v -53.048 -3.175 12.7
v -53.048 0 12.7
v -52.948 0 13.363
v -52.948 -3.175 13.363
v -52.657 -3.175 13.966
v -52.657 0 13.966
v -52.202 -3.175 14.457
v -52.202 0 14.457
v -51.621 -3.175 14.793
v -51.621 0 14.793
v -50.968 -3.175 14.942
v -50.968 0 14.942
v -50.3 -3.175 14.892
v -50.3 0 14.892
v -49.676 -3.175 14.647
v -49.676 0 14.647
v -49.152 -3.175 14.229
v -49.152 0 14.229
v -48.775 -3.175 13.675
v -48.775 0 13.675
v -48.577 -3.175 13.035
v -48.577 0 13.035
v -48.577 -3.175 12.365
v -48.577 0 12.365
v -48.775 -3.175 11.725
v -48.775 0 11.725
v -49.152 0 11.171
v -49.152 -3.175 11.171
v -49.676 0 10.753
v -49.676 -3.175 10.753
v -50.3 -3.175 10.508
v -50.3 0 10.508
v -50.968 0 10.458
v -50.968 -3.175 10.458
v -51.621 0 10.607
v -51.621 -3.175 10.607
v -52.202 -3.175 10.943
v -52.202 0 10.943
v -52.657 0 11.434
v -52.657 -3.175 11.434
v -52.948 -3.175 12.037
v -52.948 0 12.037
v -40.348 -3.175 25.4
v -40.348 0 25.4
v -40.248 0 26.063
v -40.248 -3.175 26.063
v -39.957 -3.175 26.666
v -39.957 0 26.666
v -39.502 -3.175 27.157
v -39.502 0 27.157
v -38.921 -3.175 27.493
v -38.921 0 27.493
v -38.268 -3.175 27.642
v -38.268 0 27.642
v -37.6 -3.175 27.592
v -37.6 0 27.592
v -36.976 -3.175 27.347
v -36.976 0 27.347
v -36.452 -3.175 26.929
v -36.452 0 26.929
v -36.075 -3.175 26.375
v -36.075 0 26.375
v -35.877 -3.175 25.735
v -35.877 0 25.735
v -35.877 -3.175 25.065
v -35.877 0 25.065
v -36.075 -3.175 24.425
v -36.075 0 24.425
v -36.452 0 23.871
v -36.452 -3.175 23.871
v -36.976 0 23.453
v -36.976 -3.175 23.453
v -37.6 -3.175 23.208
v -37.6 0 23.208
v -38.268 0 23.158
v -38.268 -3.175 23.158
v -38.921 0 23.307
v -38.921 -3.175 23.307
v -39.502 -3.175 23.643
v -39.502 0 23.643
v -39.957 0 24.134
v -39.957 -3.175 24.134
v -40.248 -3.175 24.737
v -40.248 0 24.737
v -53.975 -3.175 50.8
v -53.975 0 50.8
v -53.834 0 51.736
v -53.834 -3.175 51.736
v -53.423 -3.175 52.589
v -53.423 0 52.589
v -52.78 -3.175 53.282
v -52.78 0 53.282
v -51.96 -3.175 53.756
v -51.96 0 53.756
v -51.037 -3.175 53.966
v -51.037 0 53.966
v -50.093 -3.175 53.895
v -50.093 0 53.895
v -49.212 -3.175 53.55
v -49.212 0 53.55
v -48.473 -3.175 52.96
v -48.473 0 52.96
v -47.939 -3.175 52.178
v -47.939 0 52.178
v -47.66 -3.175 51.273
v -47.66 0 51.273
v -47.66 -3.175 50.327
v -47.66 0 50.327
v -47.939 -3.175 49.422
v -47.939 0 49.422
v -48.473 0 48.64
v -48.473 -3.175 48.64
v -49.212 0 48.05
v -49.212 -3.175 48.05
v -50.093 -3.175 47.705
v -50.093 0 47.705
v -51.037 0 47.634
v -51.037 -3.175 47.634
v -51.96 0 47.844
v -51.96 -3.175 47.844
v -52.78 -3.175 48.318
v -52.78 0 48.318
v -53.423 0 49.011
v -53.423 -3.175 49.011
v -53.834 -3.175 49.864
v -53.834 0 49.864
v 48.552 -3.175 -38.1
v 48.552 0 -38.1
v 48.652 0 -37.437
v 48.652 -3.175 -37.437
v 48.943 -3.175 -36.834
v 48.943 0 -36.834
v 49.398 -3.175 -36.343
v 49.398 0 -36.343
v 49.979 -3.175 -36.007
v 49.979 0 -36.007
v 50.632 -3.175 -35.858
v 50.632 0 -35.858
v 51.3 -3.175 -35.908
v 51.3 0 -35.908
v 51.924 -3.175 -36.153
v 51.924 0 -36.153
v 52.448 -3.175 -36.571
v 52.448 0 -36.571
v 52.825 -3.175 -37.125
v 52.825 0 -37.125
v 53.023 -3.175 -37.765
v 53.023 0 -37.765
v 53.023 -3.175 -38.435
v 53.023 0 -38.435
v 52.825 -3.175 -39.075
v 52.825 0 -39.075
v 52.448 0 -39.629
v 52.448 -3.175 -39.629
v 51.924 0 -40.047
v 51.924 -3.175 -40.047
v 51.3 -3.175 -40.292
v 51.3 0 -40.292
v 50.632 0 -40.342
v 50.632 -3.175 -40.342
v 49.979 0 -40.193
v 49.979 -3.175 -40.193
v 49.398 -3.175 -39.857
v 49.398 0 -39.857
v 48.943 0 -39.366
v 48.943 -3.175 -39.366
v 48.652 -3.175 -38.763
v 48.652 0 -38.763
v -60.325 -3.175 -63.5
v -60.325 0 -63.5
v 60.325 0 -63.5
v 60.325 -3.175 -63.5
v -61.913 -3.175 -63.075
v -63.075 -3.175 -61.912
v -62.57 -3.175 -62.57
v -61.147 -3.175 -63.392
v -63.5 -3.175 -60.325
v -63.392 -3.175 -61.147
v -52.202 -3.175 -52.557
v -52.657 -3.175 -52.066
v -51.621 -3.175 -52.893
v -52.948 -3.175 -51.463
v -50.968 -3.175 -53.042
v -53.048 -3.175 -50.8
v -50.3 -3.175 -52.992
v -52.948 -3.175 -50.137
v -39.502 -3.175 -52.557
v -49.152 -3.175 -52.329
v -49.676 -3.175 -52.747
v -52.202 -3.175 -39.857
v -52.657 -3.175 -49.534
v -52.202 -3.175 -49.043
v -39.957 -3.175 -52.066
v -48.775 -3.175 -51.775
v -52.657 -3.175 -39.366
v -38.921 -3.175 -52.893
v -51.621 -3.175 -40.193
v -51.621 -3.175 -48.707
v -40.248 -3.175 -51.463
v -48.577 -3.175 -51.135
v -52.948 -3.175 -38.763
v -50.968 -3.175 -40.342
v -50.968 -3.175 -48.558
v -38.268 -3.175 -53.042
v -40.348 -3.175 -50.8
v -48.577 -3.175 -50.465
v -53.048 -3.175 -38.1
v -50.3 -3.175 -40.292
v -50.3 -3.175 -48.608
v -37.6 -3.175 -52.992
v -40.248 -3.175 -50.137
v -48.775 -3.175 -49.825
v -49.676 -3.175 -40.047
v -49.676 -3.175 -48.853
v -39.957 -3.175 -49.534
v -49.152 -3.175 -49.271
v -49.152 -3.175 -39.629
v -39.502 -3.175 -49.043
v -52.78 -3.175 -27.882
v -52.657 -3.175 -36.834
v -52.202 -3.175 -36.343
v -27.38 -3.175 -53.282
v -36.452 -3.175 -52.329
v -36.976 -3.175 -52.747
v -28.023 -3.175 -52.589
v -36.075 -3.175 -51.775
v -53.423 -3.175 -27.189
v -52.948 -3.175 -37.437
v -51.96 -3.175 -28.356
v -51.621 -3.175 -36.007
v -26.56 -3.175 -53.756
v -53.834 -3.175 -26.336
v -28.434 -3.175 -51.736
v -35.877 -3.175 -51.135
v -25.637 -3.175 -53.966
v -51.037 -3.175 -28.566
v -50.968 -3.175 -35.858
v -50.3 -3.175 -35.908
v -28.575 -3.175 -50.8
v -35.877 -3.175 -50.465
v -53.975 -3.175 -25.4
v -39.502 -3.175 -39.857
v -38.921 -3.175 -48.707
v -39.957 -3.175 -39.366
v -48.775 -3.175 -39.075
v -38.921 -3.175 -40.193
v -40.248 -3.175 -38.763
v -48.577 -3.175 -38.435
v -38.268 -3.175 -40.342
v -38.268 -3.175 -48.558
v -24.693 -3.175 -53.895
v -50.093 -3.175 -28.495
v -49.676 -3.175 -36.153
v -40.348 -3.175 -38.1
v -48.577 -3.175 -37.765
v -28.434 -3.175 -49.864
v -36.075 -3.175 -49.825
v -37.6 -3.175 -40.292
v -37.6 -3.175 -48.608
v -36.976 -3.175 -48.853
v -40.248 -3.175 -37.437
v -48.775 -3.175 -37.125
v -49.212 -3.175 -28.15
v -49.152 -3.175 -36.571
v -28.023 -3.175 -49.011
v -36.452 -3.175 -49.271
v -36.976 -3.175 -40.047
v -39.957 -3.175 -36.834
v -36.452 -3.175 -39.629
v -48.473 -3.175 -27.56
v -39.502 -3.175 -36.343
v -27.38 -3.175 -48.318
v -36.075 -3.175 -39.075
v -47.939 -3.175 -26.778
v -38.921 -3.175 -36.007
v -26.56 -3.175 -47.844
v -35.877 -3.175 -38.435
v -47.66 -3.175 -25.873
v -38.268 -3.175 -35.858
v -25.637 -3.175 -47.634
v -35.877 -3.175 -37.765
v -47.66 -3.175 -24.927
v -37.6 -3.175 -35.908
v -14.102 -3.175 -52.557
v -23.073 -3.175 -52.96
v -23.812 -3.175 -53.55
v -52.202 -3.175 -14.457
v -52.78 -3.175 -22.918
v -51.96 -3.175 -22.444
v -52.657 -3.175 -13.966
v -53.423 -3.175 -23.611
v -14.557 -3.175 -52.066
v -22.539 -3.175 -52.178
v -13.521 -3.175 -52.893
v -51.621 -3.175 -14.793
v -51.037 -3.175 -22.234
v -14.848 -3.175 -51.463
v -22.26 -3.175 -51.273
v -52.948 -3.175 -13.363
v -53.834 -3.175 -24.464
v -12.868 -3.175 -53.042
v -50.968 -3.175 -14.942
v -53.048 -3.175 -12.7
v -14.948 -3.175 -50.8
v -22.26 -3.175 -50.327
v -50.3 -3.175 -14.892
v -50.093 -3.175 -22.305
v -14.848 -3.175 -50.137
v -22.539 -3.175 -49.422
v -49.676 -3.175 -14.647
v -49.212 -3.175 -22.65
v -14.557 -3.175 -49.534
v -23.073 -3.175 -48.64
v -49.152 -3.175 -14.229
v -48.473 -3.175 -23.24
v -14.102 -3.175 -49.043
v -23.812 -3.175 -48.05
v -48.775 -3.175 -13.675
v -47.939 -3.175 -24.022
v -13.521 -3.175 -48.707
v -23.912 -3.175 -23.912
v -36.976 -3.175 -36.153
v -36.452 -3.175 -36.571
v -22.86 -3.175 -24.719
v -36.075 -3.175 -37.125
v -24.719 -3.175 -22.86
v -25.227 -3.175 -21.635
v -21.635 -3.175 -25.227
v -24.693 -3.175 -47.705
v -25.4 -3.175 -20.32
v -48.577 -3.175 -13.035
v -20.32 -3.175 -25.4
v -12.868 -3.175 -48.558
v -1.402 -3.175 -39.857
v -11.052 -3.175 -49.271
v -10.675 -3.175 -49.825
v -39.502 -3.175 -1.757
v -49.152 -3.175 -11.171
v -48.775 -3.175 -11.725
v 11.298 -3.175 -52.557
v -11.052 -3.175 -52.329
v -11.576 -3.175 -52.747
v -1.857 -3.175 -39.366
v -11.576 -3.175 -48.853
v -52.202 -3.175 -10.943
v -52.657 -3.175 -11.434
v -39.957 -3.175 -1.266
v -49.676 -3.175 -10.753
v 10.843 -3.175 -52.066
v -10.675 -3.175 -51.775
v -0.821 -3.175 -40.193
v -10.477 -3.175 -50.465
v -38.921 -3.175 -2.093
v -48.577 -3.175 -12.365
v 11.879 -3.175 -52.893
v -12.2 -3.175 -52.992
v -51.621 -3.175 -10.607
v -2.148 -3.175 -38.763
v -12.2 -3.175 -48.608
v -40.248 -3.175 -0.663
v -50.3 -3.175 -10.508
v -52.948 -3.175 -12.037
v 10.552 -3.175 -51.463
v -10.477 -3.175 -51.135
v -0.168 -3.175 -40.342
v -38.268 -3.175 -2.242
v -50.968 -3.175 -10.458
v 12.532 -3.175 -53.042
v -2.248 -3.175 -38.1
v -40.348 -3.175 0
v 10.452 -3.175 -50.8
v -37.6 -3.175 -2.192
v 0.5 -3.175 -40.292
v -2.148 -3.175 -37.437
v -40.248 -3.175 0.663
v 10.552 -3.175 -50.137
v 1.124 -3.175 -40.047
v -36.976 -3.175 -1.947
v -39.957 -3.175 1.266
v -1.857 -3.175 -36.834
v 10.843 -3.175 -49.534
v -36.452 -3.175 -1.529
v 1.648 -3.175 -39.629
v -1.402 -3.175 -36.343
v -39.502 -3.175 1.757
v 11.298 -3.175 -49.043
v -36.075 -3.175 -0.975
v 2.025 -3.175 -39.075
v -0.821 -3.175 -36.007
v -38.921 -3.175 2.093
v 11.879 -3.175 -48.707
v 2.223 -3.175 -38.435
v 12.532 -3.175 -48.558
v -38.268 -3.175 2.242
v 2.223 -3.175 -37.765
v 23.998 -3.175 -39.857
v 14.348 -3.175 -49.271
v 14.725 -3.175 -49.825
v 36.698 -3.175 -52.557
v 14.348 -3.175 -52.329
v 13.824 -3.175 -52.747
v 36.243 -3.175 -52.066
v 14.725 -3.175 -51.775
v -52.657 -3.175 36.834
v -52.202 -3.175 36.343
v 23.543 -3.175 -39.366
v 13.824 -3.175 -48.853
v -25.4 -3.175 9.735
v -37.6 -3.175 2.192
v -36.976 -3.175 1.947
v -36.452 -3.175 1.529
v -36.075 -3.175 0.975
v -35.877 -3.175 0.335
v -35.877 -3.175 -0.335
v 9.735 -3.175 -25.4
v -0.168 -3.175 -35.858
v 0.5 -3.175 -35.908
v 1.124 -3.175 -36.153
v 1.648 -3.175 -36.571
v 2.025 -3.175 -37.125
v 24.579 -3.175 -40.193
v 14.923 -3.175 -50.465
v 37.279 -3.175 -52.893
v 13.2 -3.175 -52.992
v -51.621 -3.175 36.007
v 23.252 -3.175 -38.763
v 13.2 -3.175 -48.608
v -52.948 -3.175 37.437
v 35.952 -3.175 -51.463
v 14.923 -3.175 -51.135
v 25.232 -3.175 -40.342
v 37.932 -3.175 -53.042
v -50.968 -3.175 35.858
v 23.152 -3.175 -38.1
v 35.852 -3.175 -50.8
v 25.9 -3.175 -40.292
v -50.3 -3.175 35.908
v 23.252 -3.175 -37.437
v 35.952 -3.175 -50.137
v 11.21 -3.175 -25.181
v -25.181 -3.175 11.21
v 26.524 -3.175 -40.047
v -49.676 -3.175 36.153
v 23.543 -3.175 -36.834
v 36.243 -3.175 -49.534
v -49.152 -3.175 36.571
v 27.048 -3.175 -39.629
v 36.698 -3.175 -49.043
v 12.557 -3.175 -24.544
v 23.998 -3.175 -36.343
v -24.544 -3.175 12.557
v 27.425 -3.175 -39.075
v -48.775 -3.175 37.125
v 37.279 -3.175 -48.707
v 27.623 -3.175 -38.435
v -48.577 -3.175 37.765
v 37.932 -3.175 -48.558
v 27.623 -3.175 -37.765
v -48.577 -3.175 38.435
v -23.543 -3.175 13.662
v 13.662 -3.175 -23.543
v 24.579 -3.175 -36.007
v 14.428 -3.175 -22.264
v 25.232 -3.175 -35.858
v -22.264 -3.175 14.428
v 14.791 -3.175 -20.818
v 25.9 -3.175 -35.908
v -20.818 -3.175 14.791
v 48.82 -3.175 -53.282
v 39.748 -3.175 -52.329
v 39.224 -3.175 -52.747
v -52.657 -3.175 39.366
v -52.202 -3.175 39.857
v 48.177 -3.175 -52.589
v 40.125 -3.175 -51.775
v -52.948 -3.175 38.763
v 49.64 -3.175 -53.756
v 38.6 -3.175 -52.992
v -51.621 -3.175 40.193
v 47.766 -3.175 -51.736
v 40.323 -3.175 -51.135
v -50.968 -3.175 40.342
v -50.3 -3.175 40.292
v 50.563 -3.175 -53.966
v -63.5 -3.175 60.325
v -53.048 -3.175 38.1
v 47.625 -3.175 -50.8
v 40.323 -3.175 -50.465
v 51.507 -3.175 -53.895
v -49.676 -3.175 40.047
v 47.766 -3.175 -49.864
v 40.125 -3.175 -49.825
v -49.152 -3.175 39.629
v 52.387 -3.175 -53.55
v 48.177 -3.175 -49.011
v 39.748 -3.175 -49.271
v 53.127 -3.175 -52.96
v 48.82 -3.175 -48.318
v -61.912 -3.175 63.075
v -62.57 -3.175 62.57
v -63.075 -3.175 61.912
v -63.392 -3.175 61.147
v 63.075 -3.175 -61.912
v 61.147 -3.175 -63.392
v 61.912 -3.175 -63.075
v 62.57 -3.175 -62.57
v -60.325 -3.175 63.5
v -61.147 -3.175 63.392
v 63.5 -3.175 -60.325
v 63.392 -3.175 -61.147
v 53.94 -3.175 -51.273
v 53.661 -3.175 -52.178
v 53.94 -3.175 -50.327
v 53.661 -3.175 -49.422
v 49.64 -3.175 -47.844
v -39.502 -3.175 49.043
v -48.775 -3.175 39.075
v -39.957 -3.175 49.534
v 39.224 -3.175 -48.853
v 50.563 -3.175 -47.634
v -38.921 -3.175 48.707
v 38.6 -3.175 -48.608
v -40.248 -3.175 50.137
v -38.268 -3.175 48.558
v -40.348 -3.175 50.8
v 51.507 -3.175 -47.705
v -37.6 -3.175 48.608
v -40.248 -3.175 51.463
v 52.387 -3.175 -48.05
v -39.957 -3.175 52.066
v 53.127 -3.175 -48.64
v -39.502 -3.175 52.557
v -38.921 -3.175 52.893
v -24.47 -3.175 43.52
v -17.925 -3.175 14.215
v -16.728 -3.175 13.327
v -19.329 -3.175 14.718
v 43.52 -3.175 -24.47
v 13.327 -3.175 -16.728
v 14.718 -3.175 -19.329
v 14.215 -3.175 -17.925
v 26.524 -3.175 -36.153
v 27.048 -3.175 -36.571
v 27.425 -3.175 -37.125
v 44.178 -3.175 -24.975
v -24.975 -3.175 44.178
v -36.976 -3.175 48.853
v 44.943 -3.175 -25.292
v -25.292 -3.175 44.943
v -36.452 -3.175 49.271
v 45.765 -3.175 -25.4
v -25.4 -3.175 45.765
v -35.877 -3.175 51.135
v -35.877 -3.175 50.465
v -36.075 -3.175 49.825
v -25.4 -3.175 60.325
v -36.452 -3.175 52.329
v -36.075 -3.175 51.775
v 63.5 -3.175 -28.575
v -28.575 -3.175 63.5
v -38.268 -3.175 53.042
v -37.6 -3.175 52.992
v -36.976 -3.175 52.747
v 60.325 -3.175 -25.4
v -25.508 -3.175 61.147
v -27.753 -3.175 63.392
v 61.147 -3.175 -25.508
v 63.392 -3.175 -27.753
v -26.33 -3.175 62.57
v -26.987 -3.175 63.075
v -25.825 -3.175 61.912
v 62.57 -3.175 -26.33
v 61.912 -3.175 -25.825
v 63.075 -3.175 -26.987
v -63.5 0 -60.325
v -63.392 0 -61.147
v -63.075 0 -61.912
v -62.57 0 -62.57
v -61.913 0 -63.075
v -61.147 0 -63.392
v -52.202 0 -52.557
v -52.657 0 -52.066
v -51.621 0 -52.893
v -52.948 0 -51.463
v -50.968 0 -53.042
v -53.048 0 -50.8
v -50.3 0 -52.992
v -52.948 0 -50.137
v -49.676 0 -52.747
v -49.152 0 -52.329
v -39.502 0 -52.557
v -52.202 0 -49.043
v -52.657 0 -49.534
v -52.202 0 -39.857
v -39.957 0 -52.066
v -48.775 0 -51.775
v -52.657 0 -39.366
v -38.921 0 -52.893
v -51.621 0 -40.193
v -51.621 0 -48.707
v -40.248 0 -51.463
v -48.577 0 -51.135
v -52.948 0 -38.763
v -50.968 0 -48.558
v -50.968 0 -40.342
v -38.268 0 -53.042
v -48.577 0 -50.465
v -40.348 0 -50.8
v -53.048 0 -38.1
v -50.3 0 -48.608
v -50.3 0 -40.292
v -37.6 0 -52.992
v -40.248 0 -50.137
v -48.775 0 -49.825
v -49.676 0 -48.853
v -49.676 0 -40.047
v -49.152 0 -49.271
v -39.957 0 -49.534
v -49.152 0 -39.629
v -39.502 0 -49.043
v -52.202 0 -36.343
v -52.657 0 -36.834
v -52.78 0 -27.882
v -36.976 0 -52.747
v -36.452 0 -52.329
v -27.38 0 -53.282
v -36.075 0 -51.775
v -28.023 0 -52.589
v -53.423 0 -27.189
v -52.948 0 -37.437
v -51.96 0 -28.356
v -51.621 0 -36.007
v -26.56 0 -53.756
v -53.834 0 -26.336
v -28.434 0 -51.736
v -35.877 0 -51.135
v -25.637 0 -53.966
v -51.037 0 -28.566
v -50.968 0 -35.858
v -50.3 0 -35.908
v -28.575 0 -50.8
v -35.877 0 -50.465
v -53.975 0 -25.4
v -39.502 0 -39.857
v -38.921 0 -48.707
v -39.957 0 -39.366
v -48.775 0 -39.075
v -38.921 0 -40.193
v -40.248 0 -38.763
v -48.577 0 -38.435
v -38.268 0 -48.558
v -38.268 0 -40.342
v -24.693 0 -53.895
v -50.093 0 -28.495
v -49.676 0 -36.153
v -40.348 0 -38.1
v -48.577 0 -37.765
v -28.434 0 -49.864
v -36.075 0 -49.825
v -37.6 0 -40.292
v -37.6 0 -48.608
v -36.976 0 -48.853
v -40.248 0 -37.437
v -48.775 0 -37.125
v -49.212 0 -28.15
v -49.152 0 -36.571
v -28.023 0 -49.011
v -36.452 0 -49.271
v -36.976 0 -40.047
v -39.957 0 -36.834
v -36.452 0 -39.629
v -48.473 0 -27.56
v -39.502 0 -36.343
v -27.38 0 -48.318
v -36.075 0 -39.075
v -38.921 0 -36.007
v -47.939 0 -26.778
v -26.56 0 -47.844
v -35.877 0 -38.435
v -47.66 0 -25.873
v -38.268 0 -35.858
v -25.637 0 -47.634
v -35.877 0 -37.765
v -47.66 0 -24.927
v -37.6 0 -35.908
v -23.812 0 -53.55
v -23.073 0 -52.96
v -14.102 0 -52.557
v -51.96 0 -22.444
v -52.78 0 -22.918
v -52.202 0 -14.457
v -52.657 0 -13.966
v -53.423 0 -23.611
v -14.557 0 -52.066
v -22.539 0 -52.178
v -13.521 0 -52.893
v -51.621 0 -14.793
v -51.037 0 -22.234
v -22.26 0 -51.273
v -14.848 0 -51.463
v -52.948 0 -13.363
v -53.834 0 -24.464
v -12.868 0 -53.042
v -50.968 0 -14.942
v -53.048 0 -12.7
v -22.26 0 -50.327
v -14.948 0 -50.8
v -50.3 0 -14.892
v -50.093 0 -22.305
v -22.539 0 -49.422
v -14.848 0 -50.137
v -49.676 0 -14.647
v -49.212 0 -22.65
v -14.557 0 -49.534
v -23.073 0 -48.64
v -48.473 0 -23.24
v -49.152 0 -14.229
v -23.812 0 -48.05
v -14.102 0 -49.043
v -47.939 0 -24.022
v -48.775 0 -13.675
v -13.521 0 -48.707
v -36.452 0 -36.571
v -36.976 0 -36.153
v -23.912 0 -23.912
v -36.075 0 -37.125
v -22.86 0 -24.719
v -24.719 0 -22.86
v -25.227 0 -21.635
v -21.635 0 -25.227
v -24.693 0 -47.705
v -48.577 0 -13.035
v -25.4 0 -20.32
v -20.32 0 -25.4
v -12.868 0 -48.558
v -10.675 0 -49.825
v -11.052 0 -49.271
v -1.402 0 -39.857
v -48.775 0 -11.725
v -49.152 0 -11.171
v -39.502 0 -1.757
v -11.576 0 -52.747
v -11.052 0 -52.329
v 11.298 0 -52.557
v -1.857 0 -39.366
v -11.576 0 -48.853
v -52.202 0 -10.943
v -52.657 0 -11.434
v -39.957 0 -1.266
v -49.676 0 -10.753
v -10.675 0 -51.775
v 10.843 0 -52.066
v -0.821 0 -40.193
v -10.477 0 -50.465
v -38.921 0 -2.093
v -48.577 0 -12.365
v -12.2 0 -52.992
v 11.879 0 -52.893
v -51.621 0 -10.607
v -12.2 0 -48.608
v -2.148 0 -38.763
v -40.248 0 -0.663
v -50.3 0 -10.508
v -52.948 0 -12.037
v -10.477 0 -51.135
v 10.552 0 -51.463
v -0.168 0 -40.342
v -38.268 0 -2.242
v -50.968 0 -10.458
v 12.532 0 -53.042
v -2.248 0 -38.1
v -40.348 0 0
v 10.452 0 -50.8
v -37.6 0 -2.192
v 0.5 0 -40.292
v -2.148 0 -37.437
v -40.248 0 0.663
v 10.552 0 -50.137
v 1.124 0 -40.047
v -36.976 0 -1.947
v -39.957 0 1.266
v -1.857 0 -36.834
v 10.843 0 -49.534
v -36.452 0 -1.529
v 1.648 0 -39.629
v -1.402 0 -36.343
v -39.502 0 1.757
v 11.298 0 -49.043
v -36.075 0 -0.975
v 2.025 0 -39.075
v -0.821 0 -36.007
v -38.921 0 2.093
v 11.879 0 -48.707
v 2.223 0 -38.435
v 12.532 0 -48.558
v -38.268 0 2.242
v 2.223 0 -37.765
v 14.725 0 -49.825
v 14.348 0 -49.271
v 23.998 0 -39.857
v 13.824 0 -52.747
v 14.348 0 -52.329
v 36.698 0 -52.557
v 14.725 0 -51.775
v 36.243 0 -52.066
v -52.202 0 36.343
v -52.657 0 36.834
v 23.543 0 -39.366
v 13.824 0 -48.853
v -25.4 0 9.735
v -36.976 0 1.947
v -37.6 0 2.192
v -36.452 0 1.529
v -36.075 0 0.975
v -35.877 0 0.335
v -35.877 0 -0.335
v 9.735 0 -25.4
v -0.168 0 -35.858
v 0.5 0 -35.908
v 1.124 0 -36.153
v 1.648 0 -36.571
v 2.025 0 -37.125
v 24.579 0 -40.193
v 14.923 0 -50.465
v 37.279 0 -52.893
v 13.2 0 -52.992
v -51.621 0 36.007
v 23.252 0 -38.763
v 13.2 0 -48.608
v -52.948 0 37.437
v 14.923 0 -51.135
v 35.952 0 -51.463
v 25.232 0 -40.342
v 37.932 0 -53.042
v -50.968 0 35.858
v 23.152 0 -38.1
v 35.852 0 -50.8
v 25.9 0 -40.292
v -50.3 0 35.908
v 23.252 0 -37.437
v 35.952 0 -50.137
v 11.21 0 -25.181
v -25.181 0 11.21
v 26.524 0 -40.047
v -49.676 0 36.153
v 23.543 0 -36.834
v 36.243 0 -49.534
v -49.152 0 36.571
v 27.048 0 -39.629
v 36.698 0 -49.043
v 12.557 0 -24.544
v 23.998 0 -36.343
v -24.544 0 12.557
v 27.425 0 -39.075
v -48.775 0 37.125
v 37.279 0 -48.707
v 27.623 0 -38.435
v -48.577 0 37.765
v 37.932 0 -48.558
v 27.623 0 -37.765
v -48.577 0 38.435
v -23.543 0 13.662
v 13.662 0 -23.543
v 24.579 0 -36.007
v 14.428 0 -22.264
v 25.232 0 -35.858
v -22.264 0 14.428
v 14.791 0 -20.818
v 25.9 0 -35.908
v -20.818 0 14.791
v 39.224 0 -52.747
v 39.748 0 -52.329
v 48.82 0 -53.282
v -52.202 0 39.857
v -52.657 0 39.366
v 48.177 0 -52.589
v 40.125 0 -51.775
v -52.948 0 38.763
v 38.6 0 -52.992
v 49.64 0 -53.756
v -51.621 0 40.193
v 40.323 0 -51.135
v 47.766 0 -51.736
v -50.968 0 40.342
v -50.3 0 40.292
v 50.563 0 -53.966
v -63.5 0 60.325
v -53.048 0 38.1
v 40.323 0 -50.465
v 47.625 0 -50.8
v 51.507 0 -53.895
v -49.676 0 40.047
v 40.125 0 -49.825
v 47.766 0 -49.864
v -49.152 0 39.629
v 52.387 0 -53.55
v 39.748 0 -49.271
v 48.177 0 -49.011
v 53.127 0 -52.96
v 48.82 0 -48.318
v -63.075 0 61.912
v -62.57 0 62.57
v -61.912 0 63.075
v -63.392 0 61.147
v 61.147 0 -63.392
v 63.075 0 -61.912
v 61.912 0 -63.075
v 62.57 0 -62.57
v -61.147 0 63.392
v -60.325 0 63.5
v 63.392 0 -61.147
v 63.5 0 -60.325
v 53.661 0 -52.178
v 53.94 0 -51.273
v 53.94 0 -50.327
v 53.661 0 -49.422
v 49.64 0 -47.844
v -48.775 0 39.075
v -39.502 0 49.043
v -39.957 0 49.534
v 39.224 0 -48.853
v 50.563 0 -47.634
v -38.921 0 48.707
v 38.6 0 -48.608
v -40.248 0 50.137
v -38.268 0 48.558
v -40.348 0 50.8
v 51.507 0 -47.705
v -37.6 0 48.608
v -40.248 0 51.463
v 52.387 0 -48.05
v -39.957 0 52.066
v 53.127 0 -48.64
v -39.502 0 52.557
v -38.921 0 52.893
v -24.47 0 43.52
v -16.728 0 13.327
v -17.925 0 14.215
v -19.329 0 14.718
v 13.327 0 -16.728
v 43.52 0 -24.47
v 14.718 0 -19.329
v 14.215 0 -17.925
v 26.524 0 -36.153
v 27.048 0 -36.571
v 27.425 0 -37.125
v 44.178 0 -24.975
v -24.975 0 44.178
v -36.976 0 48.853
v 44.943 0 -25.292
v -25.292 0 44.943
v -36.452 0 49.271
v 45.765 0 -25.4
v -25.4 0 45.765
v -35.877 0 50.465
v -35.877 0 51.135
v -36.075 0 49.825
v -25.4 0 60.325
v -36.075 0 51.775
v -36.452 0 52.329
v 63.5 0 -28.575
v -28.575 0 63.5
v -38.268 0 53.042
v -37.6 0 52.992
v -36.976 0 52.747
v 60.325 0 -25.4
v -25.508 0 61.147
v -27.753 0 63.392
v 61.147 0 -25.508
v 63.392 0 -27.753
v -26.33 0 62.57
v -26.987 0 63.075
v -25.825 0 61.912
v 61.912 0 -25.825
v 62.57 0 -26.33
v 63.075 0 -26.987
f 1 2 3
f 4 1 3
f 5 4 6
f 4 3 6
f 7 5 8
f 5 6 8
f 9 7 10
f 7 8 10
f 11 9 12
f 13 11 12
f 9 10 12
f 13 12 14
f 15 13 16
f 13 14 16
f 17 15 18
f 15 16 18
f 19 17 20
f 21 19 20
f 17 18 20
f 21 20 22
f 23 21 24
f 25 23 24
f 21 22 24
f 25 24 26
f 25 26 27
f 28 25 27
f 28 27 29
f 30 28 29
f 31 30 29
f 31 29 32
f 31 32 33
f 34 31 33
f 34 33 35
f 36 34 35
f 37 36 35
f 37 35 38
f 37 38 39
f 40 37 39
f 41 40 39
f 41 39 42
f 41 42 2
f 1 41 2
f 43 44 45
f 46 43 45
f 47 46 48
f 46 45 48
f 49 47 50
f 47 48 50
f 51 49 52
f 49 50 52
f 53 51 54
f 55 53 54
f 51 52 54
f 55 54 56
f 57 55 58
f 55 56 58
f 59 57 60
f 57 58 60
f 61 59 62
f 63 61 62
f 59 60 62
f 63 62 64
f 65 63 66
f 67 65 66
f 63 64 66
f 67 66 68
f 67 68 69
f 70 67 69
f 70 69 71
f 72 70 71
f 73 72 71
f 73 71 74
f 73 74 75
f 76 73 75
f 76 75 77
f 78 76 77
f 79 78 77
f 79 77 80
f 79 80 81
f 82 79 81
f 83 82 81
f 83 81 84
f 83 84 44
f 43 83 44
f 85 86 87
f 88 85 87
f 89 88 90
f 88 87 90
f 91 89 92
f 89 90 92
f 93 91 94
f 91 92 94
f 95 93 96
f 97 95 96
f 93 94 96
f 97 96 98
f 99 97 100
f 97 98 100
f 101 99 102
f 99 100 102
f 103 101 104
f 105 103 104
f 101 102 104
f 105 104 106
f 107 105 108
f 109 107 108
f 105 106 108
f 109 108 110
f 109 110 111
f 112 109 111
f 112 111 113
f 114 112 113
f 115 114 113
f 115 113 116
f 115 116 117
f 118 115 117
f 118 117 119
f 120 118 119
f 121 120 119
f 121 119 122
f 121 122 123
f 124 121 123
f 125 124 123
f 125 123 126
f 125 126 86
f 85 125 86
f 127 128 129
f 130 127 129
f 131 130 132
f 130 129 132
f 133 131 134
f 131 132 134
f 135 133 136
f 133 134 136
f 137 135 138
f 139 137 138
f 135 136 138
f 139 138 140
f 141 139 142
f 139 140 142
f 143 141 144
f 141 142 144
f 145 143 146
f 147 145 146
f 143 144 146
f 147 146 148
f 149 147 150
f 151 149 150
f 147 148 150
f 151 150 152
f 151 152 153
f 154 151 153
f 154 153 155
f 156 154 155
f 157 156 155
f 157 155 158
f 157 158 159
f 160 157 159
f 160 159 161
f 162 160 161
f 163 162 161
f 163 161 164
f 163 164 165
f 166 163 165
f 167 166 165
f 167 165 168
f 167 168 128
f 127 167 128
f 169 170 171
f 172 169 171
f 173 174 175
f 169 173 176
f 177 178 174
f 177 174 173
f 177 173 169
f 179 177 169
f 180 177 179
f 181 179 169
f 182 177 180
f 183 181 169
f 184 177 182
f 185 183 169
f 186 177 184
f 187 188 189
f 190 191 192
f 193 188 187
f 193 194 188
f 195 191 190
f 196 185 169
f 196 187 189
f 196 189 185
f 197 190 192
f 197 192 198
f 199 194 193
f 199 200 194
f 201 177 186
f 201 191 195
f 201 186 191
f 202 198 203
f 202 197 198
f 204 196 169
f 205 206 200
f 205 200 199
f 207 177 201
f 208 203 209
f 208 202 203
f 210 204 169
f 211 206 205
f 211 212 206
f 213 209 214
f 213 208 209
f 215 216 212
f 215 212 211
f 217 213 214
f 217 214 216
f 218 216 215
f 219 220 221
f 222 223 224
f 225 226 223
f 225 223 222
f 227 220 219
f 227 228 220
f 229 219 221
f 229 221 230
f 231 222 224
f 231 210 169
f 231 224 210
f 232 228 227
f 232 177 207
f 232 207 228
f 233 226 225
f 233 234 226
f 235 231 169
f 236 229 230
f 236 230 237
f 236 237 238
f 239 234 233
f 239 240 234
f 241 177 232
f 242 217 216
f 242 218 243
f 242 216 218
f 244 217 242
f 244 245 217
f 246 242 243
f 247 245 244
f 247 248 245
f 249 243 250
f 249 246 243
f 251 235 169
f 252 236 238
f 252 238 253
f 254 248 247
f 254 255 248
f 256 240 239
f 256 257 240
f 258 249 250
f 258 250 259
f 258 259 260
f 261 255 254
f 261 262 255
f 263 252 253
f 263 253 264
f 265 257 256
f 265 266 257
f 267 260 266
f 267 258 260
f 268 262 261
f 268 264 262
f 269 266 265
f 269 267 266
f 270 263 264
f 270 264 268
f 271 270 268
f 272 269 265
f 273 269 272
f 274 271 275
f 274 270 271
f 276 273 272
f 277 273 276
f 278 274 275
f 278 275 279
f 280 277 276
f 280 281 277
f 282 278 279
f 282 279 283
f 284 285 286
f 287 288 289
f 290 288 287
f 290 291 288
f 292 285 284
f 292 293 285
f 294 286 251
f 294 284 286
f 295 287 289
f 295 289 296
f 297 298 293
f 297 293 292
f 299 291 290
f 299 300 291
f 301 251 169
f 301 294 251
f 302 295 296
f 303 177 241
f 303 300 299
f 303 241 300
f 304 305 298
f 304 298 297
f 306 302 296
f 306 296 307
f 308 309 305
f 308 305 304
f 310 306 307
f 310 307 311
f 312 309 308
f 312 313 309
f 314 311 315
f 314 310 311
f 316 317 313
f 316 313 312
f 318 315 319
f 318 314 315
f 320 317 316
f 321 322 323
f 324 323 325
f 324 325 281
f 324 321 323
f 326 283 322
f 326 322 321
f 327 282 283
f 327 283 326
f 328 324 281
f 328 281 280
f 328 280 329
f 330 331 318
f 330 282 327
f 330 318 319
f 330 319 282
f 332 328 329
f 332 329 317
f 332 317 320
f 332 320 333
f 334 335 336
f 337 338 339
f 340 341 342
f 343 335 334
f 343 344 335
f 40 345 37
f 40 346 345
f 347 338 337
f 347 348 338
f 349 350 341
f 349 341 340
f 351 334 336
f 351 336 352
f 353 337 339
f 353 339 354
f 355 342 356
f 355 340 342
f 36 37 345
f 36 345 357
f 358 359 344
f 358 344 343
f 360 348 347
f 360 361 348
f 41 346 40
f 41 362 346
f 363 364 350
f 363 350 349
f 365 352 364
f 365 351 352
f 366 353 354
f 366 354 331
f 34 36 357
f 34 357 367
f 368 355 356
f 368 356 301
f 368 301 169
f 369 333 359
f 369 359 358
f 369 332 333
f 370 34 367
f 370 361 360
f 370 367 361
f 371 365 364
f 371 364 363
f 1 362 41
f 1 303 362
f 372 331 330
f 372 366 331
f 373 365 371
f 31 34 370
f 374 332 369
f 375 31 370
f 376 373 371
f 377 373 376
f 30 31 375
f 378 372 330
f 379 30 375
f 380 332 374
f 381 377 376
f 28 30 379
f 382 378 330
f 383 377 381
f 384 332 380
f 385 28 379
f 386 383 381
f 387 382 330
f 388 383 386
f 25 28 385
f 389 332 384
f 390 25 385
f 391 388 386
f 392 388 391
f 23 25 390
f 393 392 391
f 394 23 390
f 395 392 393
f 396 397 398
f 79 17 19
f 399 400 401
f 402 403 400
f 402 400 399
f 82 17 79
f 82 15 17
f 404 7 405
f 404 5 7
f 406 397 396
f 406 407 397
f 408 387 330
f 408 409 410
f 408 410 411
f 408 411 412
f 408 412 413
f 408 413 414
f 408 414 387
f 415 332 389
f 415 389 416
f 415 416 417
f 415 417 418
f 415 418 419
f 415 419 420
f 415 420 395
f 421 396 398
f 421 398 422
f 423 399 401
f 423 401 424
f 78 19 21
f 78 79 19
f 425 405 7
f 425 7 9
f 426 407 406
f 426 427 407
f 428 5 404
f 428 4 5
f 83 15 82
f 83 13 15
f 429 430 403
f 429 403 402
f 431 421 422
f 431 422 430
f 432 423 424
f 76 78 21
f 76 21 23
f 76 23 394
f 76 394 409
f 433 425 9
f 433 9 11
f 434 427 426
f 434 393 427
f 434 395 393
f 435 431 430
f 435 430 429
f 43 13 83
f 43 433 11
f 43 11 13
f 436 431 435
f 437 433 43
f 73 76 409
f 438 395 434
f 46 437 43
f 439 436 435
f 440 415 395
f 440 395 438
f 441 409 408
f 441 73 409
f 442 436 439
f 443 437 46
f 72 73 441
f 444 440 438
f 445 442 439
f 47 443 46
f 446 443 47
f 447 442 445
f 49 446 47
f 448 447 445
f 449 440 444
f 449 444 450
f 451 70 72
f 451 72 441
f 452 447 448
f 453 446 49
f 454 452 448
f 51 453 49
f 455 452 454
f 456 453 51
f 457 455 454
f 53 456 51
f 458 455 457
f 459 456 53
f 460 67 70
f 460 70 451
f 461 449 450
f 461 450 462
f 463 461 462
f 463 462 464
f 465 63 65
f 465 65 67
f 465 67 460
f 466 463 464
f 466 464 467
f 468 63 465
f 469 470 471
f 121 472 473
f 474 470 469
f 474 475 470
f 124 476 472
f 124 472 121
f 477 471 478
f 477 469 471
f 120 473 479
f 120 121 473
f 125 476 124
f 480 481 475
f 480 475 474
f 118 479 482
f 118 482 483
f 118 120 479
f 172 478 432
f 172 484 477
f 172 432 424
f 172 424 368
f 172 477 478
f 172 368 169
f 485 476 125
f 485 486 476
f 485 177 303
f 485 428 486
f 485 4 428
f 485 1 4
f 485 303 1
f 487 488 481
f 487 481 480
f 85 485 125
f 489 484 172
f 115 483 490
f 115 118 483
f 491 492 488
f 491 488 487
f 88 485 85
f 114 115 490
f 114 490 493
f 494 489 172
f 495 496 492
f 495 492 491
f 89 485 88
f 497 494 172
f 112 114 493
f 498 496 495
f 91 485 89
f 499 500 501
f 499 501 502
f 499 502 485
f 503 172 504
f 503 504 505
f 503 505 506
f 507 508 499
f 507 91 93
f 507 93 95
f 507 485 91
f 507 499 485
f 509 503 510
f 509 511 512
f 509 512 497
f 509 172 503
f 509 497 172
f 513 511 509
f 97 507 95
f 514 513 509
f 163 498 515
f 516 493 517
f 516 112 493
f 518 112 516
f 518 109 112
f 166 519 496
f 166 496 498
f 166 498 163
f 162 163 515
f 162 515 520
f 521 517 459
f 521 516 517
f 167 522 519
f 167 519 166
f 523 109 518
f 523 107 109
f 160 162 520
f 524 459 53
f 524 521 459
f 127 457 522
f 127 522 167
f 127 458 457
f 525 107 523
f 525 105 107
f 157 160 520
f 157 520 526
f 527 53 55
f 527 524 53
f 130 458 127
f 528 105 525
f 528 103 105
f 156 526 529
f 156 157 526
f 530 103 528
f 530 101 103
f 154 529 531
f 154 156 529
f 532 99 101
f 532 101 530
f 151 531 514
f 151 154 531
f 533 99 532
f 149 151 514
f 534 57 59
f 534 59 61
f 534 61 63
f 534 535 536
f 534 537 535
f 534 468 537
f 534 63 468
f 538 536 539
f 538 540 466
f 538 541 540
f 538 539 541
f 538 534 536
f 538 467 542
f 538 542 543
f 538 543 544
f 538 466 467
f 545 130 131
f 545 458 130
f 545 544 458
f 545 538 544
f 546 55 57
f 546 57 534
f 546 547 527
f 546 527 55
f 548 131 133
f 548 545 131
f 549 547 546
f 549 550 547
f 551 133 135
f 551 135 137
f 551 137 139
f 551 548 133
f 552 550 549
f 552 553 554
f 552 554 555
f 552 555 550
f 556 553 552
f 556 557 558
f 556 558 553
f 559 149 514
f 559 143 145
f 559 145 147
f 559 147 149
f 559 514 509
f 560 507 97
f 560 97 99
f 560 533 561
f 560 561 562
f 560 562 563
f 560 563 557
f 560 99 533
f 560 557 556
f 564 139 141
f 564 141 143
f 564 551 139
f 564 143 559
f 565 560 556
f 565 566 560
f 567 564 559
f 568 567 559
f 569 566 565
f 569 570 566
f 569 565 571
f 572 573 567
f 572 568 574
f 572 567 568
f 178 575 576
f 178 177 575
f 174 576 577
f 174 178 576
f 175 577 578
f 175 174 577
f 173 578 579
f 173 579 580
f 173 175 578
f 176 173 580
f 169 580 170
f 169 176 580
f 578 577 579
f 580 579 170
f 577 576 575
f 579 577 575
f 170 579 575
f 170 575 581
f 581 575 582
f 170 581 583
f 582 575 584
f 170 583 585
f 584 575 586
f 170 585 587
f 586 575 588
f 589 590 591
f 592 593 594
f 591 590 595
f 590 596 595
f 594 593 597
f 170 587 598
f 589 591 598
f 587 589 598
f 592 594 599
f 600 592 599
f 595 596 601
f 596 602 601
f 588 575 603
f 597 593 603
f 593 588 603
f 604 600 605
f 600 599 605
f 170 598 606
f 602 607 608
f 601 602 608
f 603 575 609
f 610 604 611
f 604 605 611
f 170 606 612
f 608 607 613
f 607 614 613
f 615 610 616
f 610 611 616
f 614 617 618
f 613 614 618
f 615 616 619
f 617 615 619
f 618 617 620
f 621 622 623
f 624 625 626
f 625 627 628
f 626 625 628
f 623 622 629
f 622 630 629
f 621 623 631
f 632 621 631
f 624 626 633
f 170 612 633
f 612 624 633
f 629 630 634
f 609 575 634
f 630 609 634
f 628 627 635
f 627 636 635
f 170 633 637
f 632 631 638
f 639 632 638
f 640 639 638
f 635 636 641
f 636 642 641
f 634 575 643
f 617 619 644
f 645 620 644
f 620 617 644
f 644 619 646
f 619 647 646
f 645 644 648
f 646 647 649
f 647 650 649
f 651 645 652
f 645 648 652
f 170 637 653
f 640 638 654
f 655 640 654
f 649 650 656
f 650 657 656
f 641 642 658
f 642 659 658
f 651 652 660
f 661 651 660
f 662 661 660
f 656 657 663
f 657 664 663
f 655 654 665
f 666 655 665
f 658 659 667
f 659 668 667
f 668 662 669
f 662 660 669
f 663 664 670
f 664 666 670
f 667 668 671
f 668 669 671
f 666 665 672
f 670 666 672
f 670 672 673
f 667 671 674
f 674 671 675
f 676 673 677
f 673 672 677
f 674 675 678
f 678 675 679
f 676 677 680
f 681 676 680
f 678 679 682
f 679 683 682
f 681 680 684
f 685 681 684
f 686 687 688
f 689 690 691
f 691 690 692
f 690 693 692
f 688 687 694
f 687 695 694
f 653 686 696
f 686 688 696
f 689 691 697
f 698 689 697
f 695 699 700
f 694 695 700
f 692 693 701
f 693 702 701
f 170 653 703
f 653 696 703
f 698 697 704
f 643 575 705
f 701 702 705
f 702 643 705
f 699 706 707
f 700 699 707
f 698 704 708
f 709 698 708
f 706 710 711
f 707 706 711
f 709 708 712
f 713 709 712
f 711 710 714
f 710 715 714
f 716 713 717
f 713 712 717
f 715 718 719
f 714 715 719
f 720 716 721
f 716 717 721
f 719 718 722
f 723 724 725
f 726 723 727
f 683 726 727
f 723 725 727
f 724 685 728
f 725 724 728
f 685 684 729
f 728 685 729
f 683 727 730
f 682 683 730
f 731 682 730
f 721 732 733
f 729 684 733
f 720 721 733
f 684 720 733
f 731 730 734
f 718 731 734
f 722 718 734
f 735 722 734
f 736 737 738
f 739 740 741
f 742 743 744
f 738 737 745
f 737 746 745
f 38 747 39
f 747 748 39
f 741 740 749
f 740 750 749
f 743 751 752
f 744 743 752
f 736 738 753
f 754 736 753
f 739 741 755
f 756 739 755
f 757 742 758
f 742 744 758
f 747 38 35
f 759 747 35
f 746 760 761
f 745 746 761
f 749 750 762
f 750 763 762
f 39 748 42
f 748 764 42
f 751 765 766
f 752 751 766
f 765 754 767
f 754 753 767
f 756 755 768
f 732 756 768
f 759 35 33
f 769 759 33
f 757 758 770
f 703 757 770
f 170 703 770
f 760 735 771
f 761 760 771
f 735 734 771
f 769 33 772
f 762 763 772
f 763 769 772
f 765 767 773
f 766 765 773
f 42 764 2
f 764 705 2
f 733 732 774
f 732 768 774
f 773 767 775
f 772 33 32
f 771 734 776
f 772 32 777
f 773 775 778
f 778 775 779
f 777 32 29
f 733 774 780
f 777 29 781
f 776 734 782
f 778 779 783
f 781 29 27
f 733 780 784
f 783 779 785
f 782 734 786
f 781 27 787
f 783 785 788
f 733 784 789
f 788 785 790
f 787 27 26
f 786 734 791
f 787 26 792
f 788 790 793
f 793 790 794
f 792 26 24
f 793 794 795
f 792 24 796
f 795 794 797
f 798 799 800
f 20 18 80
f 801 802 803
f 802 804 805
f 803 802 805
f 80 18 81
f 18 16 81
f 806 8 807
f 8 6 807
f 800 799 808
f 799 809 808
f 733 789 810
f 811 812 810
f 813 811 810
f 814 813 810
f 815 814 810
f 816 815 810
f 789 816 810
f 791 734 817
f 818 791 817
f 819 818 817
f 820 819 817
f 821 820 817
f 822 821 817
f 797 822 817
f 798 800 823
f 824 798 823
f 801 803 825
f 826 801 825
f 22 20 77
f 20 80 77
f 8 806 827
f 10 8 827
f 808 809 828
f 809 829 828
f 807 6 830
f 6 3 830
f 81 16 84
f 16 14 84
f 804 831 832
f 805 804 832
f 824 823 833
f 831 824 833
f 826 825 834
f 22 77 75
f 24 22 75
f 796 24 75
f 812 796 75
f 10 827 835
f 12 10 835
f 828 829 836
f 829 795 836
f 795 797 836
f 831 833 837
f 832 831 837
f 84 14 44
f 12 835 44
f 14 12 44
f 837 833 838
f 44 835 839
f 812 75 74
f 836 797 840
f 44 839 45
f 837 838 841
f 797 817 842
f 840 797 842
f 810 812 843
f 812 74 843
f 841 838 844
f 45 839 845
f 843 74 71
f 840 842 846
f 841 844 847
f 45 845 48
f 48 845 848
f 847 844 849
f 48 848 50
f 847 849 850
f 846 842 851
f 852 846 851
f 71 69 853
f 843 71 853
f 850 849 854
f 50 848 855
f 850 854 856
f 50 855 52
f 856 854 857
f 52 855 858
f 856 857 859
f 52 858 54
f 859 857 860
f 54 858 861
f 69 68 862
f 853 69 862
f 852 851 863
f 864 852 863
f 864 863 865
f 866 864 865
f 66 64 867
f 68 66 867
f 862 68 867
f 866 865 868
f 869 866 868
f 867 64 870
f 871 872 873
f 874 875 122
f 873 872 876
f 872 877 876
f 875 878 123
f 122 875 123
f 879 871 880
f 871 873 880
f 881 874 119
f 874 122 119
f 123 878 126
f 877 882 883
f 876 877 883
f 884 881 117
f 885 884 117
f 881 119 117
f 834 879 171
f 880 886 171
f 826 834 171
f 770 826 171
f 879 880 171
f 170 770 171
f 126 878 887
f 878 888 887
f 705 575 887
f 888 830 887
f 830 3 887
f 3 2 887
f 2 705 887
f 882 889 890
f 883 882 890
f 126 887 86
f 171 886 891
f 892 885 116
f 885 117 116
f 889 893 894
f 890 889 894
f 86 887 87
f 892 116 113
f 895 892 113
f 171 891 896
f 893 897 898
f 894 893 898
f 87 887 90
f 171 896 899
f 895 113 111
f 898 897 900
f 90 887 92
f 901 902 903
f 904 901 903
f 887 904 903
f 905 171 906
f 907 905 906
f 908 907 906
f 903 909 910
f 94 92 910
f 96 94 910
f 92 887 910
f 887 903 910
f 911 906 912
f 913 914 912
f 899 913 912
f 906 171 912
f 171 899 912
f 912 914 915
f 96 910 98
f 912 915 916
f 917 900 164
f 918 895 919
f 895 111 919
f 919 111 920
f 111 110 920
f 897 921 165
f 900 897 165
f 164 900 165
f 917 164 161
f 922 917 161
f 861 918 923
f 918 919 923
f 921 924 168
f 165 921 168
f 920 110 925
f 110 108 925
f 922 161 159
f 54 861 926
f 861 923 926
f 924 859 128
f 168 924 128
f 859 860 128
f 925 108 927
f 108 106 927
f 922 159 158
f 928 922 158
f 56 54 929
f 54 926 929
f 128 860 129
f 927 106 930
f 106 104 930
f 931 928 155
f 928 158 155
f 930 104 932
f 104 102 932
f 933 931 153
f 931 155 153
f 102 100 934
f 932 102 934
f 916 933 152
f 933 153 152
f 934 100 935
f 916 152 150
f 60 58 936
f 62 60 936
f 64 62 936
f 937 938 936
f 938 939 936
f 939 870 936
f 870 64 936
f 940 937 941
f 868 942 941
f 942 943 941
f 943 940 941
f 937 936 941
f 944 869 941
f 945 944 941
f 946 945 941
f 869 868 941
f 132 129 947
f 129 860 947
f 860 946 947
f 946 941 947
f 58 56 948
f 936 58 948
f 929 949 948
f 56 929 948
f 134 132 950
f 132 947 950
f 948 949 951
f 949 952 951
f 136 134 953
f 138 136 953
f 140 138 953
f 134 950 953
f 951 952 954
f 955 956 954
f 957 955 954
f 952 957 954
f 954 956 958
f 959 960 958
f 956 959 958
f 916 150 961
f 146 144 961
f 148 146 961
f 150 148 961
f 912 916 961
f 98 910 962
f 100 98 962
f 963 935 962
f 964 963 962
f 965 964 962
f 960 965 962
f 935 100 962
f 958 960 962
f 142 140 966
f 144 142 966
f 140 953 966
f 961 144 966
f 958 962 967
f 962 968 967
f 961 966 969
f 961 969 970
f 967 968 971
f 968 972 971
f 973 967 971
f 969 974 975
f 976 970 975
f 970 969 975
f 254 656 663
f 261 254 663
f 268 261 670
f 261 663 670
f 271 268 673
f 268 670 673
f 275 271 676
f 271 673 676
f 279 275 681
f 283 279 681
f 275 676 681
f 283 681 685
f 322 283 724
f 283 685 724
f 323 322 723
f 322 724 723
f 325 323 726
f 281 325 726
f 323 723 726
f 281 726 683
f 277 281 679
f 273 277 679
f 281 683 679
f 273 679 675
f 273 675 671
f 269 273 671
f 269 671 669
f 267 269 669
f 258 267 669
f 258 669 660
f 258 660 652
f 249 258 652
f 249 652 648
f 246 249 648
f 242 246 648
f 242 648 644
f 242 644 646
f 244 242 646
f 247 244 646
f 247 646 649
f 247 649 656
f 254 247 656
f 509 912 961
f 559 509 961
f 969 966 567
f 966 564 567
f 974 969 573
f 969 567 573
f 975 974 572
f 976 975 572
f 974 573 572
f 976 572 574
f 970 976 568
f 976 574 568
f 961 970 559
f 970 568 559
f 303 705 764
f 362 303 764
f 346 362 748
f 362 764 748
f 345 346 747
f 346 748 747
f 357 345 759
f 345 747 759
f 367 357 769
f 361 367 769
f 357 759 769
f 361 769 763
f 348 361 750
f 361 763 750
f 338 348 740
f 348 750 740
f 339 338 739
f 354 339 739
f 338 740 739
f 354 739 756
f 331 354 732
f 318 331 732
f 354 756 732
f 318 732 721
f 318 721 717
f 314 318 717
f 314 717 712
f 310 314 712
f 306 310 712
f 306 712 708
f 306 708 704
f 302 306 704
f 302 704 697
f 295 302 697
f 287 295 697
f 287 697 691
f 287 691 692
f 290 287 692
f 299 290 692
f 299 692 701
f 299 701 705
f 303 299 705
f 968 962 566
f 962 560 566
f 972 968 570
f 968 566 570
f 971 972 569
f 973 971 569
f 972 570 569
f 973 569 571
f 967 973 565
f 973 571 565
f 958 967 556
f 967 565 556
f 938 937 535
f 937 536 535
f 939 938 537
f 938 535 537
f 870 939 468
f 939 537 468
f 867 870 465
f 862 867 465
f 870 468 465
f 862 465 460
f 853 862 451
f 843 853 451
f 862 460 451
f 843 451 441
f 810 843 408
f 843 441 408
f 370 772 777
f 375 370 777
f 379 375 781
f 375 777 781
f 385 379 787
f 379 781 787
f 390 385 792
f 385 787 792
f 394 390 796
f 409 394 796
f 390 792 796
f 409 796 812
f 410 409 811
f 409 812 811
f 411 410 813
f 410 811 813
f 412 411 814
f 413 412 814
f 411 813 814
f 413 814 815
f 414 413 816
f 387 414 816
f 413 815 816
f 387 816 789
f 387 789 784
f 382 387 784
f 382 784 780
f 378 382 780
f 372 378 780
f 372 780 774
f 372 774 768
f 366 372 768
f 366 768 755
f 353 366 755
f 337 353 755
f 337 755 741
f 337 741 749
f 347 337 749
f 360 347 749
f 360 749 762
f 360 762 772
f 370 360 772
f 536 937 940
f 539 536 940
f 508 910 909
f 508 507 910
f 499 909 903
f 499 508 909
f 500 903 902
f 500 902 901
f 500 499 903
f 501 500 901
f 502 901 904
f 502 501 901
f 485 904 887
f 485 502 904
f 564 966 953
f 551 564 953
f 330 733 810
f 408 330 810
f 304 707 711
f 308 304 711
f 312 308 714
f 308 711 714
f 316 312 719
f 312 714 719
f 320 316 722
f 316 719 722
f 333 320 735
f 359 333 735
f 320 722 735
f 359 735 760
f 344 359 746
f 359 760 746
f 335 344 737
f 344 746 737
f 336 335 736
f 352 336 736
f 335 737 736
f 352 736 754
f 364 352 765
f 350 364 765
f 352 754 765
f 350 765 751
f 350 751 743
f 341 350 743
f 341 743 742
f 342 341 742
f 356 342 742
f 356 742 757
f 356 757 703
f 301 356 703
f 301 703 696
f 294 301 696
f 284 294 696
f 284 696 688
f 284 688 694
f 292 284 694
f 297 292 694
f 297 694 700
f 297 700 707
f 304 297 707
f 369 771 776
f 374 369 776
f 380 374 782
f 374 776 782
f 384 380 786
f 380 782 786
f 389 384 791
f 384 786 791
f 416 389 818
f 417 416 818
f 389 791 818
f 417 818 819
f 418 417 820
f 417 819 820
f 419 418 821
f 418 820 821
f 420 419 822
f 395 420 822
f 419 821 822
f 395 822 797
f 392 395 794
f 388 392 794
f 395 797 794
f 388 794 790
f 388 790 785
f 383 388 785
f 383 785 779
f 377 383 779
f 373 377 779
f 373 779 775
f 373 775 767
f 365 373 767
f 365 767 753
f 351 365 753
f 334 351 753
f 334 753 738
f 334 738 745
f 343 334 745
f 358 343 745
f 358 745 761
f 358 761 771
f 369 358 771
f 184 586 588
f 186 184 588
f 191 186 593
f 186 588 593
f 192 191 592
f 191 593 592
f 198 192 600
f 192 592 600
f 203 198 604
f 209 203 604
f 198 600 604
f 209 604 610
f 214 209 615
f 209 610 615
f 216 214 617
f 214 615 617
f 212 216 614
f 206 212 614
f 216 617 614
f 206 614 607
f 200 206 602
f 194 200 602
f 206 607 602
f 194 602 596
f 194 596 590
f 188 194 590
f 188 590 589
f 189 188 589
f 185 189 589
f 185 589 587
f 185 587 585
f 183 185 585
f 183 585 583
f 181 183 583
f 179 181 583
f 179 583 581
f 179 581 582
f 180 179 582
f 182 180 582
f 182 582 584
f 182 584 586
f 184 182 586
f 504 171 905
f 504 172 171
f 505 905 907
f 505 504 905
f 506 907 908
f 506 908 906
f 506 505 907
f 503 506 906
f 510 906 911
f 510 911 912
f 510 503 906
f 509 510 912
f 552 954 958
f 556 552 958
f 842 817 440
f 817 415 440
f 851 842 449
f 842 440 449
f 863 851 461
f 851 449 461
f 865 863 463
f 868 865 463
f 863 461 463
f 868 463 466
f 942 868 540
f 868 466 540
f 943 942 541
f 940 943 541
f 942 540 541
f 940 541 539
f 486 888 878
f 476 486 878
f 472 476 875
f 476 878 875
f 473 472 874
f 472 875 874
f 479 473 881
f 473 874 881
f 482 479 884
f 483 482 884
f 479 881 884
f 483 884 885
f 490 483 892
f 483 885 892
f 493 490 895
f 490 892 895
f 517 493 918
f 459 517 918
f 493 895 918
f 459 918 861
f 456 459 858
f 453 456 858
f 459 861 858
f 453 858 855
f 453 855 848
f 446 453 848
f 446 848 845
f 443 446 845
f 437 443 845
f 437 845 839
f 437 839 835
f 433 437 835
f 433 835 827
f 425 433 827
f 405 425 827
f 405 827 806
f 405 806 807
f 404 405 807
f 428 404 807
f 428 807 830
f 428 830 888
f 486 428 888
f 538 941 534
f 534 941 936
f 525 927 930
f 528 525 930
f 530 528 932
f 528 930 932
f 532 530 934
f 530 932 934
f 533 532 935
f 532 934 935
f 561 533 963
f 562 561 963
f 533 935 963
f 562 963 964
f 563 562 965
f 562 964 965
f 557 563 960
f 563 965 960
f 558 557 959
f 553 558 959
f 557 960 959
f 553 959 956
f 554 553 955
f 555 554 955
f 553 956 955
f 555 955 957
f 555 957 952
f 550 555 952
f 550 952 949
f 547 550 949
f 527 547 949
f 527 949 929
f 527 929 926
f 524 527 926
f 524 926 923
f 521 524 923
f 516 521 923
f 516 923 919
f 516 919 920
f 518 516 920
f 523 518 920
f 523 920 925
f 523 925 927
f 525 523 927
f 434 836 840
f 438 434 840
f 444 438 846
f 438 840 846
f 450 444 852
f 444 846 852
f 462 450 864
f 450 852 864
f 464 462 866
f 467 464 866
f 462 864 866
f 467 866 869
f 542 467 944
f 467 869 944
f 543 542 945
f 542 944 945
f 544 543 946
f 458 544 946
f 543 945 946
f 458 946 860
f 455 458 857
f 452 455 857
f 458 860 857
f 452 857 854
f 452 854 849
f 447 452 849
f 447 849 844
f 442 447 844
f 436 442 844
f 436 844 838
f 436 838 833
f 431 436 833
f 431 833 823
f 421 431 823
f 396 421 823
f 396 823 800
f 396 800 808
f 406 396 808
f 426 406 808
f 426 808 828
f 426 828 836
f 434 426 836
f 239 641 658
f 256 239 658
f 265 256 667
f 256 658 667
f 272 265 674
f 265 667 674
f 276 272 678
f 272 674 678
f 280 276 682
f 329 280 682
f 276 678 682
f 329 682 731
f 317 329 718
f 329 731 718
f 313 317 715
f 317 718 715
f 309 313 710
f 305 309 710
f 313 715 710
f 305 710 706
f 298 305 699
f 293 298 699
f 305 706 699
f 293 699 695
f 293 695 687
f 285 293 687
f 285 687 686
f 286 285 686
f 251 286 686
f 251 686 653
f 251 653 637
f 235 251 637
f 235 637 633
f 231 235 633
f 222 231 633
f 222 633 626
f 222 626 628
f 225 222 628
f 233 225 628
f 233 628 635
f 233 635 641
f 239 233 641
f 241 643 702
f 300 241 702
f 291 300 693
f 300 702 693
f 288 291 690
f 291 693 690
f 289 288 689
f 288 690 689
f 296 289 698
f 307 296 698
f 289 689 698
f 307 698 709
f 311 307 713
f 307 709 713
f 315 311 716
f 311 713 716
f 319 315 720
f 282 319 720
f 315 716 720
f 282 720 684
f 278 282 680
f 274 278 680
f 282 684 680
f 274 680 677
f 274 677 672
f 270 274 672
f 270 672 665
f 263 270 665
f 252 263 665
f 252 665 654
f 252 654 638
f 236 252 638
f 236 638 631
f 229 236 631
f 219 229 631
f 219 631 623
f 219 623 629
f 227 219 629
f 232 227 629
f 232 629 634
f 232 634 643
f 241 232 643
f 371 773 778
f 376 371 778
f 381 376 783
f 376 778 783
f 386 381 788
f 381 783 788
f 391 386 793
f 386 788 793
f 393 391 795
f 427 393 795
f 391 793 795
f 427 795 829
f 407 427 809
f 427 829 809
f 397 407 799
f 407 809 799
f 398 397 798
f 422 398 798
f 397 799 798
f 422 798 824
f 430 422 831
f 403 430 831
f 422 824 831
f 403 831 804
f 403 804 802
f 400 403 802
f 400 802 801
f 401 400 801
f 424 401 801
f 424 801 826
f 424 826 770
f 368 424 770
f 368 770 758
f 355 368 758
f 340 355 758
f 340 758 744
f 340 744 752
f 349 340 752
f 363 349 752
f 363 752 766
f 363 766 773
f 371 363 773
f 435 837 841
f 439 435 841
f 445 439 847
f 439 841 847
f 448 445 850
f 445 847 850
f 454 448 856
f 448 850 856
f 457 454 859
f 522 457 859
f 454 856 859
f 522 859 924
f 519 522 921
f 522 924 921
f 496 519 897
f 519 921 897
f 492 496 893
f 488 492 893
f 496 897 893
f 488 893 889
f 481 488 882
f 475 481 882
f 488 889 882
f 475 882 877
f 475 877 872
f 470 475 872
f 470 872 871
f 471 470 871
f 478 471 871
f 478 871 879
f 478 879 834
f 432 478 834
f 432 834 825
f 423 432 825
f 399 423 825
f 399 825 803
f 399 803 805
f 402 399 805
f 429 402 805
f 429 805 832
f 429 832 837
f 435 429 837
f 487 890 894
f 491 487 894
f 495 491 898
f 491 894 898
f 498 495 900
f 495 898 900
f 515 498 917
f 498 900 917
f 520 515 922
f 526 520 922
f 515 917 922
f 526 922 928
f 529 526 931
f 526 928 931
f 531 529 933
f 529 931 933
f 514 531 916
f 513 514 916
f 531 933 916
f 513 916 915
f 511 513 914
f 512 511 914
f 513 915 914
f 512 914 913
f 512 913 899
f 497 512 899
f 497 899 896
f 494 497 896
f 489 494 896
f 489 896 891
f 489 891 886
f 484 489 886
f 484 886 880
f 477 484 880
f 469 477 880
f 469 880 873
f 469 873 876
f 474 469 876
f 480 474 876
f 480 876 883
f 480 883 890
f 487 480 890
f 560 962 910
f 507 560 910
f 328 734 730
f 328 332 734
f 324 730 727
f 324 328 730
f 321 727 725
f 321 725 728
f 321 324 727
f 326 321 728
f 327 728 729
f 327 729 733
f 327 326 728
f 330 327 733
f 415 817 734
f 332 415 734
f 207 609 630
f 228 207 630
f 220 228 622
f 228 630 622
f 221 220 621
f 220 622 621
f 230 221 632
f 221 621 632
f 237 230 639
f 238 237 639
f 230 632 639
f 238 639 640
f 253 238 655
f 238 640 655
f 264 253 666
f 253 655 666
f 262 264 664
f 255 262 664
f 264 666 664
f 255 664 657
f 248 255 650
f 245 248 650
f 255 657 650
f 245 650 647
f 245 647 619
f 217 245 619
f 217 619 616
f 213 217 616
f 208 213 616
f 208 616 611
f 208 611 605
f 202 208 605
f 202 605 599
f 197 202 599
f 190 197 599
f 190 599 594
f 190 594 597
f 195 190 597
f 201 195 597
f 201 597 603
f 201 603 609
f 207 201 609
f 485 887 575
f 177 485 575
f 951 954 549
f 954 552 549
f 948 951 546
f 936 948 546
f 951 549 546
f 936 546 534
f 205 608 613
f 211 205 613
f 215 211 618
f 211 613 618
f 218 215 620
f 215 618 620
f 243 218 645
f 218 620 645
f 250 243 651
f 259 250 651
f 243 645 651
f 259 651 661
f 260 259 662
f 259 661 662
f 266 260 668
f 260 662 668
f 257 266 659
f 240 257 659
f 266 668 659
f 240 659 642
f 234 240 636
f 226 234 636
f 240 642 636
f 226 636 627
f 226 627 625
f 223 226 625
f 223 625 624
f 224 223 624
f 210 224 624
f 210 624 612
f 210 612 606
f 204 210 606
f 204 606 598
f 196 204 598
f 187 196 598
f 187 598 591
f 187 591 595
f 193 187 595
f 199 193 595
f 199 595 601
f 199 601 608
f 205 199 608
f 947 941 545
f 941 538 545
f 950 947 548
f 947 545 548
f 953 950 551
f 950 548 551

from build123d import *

# Parameters (mm, degrees)
F1_DEPTH = 3.175
F2_R     = 3.175
F3_R     = 5.08
F5_D     = 6.35
F6_D     = 4.4958


with BuildPart() as f1:
    # F0 (on Front) → F1 (new body)
    with BuildSketch(Plane.XZ):
        Polygon((-25.4, 63.5), (-63.5, 63.5), (-63.5, -63.5), (63.5, -63.5), (63.5, -25.4), (44.45, -25.4), (-25.4, 44.45), align=None)
        Polygon((-25.4, -25.4), (-25.4, 21.99936), (21.99936, -25.4), align=None, mode=Mode.SUBTRACT)
    extrude(amount=F1_DEPTH)

    # F2
    f2_edges = [f1.edges().sort_by_distance(p)[0] for p in [
        (-25.4, -1.5875, 63.5),
        (-25.4, -1.5875, 44.45),
        (44.45, -1.5875, -25.4),
        (63.5, -1.5875, -25.4),
        (63.5, -1.5875, -63.5),
        (-63.5, -1.5875, -63.5),
        (-63.5, -1.5875, 63.5),
    ]]
    fillet(f2_edges, radius=F2_R)

    # F3
    f3_edges = [f1.edges().sort_by_distance(p)[0] for p in [
        (21.99936, -1.5875, -25.4),
        (-25.4, -1.5875, -25.4),
        (-25.4, -1.5875, 21.99936),
    ]]
    fillet(f3_edges, radius=F3_R)

    # F5 (through all)
    with Locations(Plane.XZ.offset(3.175)):
        with Locations((-50.8, 50.8), (-50.8, -25.4), (50.8, -50.8), (-25.4, -50.8)):
            Hole(F5_D / 2)

    # F6 (through all)
    with Locations(Plane.XZ.offset(3.175)):
        with Locations((-50.8, 38.1), (-38.1, 50.8), (-38.1, 25.4), (-50.8, 12.7), (-38.1, 0), (-50.8, -12.7), (-38.1, -38.1), (-50.8, -38.1), (-50.8, -50.8), (-38.1, -50.8), (-12.7, -50.8), (0, -38.1), (12.7, -50.8), (25.4, -38.1), (38.1, -50.8), (50.8, -38.1)):
            Hole(F6_D / 2)


solid = f1.part
